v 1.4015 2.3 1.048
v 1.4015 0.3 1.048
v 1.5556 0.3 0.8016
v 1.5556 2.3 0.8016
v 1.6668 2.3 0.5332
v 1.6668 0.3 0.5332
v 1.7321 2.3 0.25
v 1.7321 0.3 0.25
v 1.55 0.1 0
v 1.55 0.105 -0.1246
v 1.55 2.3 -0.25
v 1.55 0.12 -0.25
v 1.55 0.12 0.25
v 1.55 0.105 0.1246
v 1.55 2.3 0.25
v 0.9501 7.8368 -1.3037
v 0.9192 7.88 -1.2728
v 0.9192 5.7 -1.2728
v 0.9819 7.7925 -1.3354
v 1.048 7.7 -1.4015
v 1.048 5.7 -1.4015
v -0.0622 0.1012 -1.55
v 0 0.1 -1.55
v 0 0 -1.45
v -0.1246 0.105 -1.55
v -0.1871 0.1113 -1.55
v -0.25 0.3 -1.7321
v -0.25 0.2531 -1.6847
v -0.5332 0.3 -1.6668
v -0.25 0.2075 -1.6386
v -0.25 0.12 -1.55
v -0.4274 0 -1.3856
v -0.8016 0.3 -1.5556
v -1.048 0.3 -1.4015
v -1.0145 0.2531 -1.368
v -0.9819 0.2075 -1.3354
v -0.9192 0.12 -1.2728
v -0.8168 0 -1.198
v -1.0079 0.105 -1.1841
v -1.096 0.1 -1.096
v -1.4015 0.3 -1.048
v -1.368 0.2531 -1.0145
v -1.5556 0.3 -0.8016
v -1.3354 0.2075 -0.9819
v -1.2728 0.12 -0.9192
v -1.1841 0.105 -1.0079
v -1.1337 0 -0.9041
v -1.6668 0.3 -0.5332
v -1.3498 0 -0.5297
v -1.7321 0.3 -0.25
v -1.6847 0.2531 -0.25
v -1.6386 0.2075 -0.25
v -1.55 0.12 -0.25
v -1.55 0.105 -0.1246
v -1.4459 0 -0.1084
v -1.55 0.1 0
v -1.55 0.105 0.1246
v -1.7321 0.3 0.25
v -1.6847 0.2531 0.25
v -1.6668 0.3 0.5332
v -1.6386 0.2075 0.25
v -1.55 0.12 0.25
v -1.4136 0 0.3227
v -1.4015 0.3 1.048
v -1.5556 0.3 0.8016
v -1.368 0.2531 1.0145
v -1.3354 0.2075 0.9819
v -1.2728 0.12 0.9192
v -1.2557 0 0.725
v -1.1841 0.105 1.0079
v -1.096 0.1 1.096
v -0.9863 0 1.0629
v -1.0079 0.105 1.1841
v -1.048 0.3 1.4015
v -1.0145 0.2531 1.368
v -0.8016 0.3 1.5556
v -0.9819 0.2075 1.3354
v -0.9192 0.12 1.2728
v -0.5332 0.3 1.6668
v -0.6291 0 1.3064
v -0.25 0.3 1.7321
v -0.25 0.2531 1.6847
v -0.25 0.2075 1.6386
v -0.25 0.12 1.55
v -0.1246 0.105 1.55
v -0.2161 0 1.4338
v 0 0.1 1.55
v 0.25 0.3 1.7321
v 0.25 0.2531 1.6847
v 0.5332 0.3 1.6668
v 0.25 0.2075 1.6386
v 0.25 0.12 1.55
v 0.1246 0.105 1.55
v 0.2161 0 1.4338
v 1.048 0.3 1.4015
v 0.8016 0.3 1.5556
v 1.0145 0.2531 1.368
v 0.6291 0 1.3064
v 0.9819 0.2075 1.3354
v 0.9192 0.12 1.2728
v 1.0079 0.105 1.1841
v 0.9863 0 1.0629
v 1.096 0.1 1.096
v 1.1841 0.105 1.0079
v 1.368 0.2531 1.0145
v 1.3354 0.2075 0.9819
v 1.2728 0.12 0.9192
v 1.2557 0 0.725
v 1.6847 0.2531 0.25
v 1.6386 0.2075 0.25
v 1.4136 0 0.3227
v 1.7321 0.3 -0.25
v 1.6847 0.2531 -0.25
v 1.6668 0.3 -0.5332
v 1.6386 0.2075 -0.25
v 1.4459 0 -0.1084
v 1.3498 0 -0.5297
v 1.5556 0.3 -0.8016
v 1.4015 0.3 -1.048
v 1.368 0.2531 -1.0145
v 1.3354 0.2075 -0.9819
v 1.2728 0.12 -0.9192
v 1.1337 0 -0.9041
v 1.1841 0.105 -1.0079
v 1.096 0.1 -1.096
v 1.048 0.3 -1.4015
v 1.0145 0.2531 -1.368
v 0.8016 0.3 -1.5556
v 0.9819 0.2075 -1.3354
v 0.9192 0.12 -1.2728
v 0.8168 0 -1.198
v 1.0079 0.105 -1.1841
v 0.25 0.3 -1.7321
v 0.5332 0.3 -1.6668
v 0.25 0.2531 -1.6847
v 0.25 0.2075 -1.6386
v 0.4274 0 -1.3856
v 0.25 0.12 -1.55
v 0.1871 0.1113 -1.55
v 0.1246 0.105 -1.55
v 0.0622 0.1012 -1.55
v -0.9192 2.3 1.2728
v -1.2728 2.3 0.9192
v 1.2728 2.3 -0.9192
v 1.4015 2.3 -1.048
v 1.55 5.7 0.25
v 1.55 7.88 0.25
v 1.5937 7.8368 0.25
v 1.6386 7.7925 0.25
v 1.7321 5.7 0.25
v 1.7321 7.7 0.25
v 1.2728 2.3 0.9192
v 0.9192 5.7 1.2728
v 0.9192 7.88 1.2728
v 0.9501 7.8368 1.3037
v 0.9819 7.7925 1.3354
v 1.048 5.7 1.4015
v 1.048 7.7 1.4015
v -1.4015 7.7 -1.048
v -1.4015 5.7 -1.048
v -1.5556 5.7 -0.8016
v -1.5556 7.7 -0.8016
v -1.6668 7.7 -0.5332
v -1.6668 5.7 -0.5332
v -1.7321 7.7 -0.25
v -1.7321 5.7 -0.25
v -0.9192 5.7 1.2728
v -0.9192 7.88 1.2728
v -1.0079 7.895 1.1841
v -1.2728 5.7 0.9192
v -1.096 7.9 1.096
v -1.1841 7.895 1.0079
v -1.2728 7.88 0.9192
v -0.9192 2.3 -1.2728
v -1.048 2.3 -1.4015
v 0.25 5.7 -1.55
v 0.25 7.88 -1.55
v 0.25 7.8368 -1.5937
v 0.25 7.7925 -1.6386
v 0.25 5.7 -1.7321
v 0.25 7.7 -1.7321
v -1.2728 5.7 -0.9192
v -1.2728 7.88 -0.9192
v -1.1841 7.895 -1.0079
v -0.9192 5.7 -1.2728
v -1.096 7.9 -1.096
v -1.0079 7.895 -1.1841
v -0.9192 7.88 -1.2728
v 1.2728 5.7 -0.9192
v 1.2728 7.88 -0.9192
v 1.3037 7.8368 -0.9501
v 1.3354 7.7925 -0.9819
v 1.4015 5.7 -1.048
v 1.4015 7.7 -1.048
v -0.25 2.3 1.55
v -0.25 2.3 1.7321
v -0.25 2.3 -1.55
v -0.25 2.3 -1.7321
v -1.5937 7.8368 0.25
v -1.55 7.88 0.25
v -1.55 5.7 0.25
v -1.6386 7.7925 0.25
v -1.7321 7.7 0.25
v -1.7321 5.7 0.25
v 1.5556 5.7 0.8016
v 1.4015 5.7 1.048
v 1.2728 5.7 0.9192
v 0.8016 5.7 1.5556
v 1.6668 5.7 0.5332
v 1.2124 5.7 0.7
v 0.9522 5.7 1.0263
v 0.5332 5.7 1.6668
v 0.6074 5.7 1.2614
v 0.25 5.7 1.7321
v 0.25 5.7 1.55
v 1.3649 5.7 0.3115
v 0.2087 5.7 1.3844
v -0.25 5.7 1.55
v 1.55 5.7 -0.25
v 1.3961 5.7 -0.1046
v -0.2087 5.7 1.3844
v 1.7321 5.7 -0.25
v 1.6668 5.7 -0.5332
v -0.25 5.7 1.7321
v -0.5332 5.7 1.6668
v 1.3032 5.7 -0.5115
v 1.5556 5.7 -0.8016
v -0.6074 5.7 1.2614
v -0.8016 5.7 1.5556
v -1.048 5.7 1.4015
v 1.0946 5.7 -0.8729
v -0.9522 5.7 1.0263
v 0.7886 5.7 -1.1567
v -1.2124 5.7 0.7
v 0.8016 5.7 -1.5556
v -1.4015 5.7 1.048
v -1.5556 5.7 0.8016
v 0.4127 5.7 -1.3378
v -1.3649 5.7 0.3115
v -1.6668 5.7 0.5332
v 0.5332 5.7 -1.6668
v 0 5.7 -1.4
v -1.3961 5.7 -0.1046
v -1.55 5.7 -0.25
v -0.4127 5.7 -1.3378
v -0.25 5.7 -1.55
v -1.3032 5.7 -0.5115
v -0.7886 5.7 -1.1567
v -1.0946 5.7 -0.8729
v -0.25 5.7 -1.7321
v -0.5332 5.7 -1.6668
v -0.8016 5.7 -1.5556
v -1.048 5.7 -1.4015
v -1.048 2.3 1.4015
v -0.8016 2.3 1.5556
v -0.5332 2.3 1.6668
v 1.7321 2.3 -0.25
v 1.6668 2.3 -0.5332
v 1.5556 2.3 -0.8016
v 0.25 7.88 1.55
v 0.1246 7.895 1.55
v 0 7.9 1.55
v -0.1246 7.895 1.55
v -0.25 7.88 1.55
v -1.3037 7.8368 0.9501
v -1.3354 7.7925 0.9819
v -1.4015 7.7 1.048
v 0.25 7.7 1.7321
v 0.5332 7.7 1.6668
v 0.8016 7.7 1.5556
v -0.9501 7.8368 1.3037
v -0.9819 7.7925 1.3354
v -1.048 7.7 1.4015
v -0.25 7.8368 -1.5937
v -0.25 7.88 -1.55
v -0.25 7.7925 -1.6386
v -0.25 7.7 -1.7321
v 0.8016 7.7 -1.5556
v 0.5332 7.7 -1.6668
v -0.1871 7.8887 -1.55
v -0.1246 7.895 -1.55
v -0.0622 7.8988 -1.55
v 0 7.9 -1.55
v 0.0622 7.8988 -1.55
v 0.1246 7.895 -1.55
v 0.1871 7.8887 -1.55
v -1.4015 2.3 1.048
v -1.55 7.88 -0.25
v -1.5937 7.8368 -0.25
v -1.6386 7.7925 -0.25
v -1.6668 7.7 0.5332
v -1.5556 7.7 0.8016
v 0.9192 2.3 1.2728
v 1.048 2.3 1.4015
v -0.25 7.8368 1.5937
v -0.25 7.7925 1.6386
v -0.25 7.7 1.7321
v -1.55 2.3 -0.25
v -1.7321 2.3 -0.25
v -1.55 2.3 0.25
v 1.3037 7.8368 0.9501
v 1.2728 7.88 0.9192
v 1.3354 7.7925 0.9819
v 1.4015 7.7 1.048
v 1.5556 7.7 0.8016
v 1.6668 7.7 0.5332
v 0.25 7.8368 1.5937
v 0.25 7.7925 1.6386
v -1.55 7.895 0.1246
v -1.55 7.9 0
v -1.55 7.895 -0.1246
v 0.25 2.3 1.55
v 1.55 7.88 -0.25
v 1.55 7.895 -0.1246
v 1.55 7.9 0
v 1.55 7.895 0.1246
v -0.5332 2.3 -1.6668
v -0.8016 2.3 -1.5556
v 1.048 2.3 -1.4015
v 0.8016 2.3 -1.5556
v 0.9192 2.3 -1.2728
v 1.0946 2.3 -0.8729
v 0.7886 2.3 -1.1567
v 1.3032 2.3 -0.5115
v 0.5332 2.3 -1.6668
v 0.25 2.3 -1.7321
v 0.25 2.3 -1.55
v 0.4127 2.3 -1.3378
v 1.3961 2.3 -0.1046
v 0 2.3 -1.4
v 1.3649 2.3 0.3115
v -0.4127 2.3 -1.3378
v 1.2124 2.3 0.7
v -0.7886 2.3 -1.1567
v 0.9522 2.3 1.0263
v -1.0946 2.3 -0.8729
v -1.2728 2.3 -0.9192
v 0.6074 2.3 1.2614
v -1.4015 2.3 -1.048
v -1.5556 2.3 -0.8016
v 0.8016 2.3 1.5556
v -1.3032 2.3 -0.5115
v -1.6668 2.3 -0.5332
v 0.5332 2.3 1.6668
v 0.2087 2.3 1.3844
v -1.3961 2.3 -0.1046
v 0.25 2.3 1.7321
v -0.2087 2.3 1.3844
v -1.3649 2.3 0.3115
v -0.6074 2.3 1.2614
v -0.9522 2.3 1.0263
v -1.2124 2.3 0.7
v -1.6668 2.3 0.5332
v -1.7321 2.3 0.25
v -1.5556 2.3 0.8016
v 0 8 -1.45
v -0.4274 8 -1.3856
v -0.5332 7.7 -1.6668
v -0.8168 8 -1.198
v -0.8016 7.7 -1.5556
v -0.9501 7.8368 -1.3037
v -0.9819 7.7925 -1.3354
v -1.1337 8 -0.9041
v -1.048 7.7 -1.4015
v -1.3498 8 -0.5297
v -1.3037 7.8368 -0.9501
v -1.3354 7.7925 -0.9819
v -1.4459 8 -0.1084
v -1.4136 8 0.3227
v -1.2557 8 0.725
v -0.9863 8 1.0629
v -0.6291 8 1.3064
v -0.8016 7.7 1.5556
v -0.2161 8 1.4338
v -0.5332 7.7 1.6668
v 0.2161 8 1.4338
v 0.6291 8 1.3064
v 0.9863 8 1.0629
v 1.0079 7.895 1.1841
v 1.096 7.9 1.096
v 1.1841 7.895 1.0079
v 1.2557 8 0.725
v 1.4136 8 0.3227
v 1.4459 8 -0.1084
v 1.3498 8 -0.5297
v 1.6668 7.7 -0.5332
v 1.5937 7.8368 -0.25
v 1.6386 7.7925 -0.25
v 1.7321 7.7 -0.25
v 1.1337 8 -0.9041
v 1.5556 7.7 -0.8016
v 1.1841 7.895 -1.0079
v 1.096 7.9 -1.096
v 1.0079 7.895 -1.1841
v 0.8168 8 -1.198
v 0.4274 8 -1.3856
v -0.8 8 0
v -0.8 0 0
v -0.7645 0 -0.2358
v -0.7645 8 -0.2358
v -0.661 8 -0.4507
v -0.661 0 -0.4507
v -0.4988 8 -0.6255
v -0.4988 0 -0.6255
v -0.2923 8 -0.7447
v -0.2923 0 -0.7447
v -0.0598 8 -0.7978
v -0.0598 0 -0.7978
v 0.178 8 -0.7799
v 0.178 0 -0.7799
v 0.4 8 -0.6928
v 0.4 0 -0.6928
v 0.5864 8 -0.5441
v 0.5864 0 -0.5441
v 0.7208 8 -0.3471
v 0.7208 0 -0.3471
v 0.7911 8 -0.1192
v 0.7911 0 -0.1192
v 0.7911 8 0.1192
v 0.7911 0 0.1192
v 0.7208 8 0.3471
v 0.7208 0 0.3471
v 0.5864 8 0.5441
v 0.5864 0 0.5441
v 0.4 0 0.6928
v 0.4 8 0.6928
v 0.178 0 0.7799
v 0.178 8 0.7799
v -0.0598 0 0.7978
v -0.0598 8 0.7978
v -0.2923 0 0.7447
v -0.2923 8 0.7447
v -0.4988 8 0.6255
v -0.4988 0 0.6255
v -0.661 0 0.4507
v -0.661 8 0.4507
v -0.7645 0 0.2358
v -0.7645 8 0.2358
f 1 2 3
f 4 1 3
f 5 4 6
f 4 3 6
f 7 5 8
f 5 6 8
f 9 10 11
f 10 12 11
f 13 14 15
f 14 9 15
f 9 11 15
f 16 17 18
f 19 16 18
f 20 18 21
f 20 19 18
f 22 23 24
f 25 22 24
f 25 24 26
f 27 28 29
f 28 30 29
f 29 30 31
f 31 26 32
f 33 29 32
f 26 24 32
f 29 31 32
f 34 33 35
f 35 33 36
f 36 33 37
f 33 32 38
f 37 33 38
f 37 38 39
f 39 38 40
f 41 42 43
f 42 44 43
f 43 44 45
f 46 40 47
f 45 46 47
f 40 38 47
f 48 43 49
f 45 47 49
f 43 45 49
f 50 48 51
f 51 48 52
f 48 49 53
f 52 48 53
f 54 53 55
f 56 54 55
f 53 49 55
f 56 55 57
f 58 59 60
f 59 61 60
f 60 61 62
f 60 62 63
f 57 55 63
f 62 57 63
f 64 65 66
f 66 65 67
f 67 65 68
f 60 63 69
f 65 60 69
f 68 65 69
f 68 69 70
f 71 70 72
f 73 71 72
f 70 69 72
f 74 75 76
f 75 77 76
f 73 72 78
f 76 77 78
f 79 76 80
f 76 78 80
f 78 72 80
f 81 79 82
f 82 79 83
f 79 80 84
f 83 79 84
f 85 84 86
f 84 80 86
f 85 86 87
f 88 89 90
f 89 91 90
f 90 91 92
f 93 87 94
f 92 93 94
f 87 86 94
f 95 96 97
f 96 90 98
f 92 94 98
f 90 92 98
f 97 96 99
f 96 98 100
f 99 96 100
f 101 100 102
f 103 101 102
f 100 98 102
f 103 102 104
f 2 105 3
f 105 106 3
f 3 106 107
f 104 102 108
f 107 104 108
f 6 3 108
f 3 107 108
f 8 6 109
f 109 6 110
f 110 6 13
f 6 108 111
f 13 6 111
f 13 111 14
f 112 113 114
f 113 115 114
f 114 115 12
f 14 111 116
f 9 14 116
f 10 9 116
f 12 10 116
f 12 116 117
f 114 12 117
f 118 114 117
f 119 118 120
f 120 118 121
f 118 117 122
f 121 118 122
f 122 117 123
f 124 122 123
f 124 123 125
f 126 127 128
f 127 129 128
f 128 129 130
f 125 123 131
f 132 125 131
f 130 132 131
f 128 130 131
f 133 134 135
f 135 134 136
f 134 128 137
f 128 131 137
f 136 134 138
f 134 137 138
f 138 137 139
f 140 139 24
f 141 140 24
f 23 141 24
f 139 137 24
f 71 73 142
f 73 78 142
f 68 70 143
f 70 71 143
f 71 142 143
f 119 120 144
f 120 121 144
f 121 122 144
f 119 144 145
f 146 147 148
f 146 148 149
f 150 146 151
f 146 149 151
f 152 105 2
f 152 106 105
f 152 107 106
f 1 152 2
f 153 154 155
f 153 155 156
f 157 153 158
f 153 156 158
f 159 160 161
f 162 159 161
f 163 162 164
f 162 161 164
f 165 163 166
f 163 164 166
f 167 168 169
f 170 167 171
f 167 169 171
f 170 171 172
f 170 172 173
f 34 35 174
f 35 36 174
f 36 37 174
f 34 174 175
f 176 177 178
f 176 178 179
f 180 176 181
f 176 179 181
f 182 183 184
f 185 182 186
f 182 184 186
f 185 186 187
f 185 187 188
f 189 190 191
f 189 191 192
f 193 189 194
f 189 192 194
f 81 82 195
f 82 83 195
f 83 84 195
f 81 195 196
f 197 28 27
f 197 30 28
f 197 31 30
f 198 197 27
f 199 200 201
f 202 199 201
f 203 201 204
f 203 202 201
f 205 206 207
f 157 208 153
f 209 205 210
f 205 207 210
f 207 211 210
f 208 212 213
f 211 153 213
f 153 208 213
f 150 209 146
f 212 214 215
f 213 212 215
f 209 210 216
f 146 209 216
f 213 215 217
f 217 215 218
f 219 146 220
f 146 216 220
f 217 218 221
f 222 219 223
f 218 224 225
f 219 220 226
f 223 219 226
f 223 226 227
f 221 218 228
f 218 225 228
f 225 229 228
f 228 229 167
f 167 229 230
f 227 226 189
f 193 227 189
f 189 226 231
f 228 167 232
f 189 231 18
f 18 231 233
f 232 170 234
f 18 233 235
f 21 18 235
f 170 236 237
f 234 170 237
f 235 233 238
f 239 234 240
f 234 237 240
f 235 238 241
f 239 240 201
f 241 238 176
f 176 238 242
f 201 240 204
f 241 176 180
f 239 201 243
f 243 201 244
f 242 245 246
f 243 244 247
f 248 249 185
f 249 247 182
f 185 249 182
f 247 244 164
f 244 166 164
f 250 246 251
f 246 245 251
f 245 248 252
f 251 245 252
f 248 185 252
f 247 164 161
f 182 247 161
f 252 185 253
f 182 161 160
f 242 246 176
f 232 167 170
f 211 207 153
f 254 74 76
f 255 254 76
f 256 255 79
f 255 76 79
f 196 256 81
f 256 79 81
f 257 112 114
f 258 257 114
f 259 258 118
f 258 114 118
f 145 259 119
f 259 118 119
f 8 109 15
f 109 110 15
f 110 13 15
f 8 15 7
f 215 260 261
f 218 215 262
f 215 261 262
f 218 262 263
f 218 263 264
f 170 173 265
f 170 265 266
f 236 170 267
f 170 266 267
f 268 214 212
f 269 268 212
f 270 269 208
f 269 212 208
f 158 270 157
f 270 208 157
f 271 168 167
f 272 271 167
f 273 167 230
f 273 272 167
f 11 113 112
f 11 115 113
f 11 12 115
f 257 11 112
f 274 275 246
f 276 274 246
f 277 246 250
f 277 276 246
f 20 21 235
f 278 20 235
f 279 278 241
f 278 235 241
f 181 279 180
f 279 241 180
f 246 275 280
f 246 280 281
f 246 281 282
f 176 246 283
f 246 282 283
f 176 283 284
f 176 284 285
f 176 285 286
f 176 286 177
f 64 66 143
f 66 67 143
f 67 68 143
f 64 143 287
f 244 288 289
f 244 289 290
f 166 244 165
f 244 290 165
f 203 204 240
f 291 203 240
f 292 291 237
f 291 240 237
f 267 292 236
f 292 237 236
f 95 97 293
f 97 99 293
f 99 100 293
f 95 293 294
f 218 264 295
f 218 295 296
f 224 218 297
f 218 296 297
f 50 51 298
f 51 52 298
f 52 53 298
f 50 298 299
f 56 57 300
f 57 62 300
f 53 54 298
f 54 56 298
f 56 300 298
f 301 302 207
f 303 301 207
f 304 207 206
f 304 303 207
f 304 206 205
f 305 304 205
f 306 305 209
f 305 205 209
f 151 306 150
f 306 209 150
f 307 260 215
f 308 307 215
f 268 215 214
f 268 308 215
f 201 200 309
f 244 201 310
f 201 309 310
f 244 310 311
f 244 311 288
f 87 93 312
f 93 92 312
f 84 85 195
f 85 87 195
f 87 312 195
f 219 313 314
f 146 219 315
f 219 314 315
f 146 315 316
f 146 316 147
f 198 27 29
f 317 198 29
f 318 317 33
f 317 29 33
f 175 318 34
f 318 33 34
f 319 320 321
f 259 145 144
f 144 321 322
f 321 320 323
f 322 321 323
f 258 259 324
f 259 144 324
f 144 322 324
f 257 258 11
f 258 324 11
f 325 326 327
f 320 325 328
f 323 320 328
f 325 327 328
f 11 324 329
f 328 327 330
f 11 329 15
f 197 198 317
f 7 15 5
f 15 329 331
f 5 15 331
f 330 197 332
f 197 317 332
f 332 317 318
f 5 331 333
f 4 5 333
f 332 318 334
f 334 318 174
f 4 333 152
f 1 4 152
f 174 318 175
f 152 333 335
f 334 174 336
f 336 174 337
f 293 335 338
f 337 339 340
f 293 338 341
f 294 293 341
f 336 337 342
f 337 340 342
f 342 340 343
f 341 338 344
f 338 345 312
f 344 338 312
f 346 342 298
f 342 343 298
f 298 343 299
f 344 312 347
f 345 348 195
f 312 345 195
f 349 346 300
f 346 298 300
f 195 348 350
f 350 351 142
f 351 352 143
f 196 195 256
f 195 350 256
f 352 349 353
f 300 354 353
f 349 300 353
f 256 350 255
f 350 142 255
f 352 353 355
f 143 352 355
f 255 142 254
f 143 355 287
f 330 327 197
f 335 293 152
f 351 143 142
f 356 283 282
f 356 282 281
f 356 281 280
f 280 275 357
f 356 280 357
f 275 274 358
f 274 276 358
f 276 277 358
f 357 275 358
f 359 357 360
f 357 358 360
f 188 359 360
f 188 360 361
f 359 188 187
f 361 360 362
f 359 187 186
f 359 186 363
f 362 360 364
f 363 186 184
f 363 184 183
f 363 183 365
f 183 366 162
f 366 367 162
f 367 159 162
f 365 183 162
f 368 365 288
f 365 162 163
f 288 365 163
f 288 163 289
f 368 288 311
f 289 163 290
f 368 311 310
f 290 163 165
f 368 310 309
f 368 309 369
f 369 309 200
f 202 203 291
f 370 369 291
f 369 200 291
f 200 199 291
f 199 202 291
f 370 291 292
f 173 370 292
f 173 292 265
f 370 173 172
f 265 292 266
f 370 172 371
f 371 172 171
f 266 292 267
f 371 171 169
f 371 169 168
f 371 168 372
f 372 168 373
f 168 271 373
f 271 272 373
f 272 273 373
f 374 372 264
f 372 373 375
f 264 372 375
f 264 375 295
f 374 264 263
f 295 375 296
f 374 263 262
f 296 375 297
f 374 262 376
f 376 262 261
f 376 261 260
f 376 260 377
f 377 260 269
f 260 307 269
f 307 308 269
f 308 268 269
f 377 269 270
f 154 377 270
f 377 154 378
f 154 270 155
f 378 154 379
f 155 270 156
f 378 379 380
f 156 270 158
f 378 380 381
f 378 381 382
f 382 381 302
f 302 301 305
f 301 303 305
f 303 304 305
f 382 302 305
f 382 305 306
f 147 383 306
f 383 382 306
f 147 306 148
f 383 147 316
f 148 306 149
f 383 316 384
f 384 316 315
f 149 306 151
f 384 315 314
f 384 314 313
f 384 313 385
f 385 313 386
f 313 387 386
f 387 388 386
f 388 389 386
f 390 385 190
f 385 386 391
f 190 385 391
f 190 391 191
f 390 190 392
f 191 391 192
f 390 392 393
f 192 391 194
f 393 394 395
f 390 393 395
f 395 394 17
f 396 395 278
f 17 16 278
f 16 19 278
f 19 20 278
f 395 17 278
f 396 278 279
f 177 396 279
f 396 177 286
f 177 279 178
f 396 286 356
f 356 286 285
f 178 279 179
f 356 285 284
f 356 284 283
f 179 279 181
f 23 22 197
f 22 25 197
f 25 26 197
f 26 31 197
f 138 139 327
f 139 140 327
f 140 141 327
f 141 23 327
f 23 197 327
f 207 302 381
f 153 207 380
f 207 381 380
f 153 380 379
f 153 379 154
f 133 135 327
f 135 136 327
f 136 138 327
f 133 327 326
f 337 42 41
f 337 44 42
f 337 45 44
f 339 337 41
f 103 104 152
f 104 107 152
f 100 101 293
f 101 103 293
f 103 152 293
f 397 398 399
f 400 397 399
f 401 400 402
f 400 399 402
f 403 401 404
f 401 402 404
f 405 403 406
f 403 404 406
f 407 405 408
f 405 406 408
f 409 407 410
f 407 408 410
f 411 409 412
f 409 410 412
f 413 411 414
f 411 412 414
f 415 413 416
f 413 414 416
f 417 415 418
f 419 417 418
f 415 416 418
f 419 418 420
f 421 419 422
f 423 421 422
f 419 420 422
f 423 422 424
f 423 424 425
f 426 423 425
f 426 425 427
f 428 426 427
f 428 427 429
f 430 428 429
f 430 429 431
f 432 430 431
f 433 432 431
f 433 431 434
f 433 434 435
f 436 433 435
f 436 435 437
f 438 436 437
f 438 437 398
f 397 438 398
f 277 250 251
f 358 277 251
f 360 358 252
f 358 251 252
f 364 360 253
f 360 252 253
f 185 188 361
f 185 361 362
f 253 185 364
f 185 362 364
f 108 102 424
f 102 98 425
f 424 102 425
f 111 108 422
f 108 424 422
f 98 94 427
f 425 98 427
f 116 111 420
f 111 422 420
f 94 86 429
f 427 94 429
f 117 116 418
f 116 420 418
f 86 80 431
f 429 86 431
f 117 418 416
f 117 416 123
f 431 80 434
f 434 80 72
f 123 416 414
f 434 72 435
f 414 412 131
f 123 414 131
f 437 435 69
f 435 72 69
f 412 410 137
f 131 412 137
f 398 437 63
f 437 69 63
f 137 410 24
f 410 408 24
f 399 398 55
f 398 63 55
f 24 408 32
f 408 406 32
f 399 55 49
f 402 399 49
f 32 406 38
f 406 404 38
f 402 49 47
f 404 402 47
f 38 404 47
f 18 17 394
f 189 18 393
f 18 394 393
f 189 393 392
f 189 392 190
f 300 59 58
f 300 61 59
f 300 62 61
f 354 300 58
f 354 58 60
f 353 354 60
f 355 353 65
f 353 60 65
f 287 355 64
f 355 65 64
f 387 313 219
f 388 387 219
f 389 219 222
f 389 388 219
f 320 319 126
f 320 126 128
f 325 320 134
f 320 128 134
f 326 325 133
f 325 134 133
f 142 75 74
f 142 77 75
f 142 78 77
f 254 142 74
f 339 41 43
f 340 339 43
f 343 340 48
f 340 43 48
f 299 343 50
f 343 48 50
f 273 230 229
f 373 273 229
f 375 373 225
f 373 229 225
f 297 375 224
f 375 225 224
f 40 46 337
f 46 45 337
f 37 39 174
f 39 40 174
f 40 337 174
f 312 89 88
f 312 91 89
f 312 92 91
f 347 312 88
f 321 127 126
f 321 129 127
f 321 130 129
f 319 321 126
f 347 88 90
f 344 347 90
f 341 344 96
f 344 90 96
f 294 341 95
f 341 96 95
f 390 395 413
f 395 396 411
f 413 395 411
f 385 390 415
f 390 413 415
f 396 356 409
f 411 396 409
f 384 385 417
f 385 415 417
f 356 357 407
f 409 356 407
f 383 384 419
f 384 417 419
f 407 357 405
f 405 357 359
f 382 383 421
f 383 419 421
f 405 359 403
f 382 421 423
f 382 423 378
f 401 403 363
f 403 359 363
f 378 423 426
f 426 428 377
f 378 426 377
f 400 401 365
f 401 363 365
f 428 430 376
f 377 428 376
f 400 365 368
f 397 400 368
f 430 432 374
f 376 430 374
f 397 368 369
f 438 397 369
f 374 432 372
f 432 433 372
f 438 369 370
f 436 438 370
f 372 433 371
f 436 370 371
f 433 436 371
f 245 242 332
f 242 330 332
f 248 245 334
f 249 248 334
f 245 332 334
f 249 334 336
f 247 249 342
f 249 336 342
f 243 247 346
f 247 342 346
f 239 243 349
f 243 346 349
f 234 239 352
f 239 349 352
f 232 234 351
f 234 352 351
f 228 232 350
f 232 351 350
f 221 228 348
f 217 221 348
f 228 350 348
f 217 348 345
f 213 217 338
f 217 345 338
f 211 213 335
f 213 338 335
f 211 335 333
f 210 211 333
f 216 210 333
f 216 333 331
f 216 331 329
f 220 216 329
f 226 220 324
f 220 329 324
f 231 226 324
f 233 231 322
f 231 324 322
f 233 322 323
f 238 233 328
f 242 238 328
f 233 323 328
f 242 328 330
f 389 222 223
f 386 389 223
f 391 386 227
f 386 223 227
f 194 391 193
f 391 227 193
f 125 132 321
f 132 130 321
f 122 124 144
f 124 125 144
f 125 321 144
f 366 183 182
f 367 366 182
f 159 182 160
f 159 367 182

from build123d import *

# Parameters (mm, degrees)
CHANFRO2_SIZE         = 0.3
CORTE_EXTRUS_O2_REACH = 10.374
ESBO_O7_W             = 0.5
ESBO_O7_H             = 0.2
PADR_OCIRCULAR1_COUNT = 8
M2X0_4_TAPPED_HOLE1_D = 1.6


with BuildPart() as part:
    # Esboço2 → Revolução1 (revolve)
    with BuildSketch(Plane.XY, mode=Mode.PRIVATE) as revolu_o1_sk:
        Polygon((0, 8), (1.75, 8), (1.75, 5.7), (1.4, 5.7), (1.4, 2.3), (1.75, 2.3), (1.75, 0), (0, 0), align=None)
    revolve(revolu_o1_sk.sketch.rotate(Axis((0, 0, 0), (0, 1, 0)), 90), axis=Axis((0, 0, 0), (0, 1, 0)))

    # Chanfro2
    chanfro2_edges = [part.edges().sort_by_distance(p)[0] for p in [
        (0, 0, 1.75),
        (0, 8, 1.75),
    ]]
    chamfer(chanfro2_edges, length=CHANFRO2_SIZE)

    # Corte-extrusão2: up to this face of the body (flat: up to its plane)
    corte_extrus_o2_end = Plane(part.part.faces().sort_by_distance((0, 0, 0))[0])
    # Esboço7 → Corte-extrusão2 (cut, up to the picked face)
    with BuildSketch(Plane(origin=(0, 8, 0), x_dir=(1, 0, 0), z_dir=(0, 1, 0)), mode=Mode.PRIVATE) as corte_extrus_o2_sk1:
        with Locations((0, 1.65)):
            Rectangle(ESBO_O7_W, ESBO_O7_H)
    corte_extrus_o2_tool1 = split(extrude(corte_extrus_o2_sk1.sketch, amount=-CORTE_EXTRUS_O2_REACH, mode=Mode.PRIVATE), bisect_by=corte_extrus_o2_end, keep=Keep.BOTH, mode=Mode.PRIVATE)
    corte_extrus_o2 = corte_extrus_o2_tool1.solids().sort_by(Axis((0, 8, -1.65), (0, -1, 0)))[0]
    add(corte_extrus_o2, mode=Mode.SUBTRACT)

    # PadrãoCircular1: Corte-extrusão2 ×8 about axis
    padr_ocircular1_axis = Axis((0, 0, 0), (0, 1, 0))
    for i in range(1, PADR_OCIRCULAR1_COUNT):
        add(corte_extrus_o2.rotate(padr_ocircular1_axis, i * 360 / PADR_OCIRCULAR1_COUNT), mode=Mode.SUBTRACT)

    # M2x0.4 Tapped Hole1 (through all)
    with Locations(Plane(origin=(0, 8, 0), x_dir=(1, 0, 0), z_dir=(0, 1, 0))):
        with Locations((0, 0)):
            Hole(M2X0_4_TAPPED_HOLE1_D / 2)


solid = part.part
